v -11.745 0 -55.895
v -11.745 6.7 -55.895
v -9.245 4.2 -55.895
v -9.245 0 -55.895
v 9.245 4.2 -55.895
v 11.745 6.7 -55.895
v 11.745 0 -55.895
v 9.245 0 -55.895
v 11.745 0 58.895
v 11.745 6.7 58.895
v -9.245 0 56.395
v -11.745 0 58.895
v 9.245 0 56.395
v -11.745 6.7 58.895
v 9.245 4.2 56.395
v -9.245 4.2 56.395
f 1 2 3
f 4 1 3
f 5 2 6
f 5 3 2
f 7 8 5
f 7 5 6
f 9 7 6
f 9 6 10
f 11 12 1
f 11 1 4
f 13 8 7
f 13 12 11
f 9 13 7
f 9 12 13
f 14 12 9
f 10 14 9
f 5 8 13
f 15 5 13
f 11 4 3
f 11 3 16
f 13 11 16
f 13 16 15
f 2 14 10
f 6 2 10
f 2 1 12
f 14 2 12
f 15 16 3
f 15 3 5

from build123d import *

# Parameters (mm, degrees)
F0_W      = 23.49
F0_H      = 117.79
F1_DEPTH  = 6.7
F2_T      = -2.5
F1_FACE_W = 23.49
F1_FACE_H = 6.7
F3_DEPTH  = 3


with BuildPart() as f1:
    # F0 (on Front) → F1 (new body)
    with BuildSketch(Plane.XZ):
        Rectangle(F0_W, F0_H)
    extrude(amount=-F1_DEPTH)

    # F2
    f2_openings = [f1.faces().sort_by_distance(p)[0] for p in [
        (0, 0, 0),
    ]]
    offset(amount=F2_T, openings=f2_openings)

    # F1_face (on face) → F3 (cut)
    with BuildSketch(Plane(origin=(0, 3.35, -58.895), x_dir=(1, 0, 0), z_dir=(0, 0, -1))):
        Rectangle(F1_FACE_W, F1_FACE_H)
    extrude(amount=-F3_DEPTH, mode=Mode.SUBTRACT)


solid = f1.part
